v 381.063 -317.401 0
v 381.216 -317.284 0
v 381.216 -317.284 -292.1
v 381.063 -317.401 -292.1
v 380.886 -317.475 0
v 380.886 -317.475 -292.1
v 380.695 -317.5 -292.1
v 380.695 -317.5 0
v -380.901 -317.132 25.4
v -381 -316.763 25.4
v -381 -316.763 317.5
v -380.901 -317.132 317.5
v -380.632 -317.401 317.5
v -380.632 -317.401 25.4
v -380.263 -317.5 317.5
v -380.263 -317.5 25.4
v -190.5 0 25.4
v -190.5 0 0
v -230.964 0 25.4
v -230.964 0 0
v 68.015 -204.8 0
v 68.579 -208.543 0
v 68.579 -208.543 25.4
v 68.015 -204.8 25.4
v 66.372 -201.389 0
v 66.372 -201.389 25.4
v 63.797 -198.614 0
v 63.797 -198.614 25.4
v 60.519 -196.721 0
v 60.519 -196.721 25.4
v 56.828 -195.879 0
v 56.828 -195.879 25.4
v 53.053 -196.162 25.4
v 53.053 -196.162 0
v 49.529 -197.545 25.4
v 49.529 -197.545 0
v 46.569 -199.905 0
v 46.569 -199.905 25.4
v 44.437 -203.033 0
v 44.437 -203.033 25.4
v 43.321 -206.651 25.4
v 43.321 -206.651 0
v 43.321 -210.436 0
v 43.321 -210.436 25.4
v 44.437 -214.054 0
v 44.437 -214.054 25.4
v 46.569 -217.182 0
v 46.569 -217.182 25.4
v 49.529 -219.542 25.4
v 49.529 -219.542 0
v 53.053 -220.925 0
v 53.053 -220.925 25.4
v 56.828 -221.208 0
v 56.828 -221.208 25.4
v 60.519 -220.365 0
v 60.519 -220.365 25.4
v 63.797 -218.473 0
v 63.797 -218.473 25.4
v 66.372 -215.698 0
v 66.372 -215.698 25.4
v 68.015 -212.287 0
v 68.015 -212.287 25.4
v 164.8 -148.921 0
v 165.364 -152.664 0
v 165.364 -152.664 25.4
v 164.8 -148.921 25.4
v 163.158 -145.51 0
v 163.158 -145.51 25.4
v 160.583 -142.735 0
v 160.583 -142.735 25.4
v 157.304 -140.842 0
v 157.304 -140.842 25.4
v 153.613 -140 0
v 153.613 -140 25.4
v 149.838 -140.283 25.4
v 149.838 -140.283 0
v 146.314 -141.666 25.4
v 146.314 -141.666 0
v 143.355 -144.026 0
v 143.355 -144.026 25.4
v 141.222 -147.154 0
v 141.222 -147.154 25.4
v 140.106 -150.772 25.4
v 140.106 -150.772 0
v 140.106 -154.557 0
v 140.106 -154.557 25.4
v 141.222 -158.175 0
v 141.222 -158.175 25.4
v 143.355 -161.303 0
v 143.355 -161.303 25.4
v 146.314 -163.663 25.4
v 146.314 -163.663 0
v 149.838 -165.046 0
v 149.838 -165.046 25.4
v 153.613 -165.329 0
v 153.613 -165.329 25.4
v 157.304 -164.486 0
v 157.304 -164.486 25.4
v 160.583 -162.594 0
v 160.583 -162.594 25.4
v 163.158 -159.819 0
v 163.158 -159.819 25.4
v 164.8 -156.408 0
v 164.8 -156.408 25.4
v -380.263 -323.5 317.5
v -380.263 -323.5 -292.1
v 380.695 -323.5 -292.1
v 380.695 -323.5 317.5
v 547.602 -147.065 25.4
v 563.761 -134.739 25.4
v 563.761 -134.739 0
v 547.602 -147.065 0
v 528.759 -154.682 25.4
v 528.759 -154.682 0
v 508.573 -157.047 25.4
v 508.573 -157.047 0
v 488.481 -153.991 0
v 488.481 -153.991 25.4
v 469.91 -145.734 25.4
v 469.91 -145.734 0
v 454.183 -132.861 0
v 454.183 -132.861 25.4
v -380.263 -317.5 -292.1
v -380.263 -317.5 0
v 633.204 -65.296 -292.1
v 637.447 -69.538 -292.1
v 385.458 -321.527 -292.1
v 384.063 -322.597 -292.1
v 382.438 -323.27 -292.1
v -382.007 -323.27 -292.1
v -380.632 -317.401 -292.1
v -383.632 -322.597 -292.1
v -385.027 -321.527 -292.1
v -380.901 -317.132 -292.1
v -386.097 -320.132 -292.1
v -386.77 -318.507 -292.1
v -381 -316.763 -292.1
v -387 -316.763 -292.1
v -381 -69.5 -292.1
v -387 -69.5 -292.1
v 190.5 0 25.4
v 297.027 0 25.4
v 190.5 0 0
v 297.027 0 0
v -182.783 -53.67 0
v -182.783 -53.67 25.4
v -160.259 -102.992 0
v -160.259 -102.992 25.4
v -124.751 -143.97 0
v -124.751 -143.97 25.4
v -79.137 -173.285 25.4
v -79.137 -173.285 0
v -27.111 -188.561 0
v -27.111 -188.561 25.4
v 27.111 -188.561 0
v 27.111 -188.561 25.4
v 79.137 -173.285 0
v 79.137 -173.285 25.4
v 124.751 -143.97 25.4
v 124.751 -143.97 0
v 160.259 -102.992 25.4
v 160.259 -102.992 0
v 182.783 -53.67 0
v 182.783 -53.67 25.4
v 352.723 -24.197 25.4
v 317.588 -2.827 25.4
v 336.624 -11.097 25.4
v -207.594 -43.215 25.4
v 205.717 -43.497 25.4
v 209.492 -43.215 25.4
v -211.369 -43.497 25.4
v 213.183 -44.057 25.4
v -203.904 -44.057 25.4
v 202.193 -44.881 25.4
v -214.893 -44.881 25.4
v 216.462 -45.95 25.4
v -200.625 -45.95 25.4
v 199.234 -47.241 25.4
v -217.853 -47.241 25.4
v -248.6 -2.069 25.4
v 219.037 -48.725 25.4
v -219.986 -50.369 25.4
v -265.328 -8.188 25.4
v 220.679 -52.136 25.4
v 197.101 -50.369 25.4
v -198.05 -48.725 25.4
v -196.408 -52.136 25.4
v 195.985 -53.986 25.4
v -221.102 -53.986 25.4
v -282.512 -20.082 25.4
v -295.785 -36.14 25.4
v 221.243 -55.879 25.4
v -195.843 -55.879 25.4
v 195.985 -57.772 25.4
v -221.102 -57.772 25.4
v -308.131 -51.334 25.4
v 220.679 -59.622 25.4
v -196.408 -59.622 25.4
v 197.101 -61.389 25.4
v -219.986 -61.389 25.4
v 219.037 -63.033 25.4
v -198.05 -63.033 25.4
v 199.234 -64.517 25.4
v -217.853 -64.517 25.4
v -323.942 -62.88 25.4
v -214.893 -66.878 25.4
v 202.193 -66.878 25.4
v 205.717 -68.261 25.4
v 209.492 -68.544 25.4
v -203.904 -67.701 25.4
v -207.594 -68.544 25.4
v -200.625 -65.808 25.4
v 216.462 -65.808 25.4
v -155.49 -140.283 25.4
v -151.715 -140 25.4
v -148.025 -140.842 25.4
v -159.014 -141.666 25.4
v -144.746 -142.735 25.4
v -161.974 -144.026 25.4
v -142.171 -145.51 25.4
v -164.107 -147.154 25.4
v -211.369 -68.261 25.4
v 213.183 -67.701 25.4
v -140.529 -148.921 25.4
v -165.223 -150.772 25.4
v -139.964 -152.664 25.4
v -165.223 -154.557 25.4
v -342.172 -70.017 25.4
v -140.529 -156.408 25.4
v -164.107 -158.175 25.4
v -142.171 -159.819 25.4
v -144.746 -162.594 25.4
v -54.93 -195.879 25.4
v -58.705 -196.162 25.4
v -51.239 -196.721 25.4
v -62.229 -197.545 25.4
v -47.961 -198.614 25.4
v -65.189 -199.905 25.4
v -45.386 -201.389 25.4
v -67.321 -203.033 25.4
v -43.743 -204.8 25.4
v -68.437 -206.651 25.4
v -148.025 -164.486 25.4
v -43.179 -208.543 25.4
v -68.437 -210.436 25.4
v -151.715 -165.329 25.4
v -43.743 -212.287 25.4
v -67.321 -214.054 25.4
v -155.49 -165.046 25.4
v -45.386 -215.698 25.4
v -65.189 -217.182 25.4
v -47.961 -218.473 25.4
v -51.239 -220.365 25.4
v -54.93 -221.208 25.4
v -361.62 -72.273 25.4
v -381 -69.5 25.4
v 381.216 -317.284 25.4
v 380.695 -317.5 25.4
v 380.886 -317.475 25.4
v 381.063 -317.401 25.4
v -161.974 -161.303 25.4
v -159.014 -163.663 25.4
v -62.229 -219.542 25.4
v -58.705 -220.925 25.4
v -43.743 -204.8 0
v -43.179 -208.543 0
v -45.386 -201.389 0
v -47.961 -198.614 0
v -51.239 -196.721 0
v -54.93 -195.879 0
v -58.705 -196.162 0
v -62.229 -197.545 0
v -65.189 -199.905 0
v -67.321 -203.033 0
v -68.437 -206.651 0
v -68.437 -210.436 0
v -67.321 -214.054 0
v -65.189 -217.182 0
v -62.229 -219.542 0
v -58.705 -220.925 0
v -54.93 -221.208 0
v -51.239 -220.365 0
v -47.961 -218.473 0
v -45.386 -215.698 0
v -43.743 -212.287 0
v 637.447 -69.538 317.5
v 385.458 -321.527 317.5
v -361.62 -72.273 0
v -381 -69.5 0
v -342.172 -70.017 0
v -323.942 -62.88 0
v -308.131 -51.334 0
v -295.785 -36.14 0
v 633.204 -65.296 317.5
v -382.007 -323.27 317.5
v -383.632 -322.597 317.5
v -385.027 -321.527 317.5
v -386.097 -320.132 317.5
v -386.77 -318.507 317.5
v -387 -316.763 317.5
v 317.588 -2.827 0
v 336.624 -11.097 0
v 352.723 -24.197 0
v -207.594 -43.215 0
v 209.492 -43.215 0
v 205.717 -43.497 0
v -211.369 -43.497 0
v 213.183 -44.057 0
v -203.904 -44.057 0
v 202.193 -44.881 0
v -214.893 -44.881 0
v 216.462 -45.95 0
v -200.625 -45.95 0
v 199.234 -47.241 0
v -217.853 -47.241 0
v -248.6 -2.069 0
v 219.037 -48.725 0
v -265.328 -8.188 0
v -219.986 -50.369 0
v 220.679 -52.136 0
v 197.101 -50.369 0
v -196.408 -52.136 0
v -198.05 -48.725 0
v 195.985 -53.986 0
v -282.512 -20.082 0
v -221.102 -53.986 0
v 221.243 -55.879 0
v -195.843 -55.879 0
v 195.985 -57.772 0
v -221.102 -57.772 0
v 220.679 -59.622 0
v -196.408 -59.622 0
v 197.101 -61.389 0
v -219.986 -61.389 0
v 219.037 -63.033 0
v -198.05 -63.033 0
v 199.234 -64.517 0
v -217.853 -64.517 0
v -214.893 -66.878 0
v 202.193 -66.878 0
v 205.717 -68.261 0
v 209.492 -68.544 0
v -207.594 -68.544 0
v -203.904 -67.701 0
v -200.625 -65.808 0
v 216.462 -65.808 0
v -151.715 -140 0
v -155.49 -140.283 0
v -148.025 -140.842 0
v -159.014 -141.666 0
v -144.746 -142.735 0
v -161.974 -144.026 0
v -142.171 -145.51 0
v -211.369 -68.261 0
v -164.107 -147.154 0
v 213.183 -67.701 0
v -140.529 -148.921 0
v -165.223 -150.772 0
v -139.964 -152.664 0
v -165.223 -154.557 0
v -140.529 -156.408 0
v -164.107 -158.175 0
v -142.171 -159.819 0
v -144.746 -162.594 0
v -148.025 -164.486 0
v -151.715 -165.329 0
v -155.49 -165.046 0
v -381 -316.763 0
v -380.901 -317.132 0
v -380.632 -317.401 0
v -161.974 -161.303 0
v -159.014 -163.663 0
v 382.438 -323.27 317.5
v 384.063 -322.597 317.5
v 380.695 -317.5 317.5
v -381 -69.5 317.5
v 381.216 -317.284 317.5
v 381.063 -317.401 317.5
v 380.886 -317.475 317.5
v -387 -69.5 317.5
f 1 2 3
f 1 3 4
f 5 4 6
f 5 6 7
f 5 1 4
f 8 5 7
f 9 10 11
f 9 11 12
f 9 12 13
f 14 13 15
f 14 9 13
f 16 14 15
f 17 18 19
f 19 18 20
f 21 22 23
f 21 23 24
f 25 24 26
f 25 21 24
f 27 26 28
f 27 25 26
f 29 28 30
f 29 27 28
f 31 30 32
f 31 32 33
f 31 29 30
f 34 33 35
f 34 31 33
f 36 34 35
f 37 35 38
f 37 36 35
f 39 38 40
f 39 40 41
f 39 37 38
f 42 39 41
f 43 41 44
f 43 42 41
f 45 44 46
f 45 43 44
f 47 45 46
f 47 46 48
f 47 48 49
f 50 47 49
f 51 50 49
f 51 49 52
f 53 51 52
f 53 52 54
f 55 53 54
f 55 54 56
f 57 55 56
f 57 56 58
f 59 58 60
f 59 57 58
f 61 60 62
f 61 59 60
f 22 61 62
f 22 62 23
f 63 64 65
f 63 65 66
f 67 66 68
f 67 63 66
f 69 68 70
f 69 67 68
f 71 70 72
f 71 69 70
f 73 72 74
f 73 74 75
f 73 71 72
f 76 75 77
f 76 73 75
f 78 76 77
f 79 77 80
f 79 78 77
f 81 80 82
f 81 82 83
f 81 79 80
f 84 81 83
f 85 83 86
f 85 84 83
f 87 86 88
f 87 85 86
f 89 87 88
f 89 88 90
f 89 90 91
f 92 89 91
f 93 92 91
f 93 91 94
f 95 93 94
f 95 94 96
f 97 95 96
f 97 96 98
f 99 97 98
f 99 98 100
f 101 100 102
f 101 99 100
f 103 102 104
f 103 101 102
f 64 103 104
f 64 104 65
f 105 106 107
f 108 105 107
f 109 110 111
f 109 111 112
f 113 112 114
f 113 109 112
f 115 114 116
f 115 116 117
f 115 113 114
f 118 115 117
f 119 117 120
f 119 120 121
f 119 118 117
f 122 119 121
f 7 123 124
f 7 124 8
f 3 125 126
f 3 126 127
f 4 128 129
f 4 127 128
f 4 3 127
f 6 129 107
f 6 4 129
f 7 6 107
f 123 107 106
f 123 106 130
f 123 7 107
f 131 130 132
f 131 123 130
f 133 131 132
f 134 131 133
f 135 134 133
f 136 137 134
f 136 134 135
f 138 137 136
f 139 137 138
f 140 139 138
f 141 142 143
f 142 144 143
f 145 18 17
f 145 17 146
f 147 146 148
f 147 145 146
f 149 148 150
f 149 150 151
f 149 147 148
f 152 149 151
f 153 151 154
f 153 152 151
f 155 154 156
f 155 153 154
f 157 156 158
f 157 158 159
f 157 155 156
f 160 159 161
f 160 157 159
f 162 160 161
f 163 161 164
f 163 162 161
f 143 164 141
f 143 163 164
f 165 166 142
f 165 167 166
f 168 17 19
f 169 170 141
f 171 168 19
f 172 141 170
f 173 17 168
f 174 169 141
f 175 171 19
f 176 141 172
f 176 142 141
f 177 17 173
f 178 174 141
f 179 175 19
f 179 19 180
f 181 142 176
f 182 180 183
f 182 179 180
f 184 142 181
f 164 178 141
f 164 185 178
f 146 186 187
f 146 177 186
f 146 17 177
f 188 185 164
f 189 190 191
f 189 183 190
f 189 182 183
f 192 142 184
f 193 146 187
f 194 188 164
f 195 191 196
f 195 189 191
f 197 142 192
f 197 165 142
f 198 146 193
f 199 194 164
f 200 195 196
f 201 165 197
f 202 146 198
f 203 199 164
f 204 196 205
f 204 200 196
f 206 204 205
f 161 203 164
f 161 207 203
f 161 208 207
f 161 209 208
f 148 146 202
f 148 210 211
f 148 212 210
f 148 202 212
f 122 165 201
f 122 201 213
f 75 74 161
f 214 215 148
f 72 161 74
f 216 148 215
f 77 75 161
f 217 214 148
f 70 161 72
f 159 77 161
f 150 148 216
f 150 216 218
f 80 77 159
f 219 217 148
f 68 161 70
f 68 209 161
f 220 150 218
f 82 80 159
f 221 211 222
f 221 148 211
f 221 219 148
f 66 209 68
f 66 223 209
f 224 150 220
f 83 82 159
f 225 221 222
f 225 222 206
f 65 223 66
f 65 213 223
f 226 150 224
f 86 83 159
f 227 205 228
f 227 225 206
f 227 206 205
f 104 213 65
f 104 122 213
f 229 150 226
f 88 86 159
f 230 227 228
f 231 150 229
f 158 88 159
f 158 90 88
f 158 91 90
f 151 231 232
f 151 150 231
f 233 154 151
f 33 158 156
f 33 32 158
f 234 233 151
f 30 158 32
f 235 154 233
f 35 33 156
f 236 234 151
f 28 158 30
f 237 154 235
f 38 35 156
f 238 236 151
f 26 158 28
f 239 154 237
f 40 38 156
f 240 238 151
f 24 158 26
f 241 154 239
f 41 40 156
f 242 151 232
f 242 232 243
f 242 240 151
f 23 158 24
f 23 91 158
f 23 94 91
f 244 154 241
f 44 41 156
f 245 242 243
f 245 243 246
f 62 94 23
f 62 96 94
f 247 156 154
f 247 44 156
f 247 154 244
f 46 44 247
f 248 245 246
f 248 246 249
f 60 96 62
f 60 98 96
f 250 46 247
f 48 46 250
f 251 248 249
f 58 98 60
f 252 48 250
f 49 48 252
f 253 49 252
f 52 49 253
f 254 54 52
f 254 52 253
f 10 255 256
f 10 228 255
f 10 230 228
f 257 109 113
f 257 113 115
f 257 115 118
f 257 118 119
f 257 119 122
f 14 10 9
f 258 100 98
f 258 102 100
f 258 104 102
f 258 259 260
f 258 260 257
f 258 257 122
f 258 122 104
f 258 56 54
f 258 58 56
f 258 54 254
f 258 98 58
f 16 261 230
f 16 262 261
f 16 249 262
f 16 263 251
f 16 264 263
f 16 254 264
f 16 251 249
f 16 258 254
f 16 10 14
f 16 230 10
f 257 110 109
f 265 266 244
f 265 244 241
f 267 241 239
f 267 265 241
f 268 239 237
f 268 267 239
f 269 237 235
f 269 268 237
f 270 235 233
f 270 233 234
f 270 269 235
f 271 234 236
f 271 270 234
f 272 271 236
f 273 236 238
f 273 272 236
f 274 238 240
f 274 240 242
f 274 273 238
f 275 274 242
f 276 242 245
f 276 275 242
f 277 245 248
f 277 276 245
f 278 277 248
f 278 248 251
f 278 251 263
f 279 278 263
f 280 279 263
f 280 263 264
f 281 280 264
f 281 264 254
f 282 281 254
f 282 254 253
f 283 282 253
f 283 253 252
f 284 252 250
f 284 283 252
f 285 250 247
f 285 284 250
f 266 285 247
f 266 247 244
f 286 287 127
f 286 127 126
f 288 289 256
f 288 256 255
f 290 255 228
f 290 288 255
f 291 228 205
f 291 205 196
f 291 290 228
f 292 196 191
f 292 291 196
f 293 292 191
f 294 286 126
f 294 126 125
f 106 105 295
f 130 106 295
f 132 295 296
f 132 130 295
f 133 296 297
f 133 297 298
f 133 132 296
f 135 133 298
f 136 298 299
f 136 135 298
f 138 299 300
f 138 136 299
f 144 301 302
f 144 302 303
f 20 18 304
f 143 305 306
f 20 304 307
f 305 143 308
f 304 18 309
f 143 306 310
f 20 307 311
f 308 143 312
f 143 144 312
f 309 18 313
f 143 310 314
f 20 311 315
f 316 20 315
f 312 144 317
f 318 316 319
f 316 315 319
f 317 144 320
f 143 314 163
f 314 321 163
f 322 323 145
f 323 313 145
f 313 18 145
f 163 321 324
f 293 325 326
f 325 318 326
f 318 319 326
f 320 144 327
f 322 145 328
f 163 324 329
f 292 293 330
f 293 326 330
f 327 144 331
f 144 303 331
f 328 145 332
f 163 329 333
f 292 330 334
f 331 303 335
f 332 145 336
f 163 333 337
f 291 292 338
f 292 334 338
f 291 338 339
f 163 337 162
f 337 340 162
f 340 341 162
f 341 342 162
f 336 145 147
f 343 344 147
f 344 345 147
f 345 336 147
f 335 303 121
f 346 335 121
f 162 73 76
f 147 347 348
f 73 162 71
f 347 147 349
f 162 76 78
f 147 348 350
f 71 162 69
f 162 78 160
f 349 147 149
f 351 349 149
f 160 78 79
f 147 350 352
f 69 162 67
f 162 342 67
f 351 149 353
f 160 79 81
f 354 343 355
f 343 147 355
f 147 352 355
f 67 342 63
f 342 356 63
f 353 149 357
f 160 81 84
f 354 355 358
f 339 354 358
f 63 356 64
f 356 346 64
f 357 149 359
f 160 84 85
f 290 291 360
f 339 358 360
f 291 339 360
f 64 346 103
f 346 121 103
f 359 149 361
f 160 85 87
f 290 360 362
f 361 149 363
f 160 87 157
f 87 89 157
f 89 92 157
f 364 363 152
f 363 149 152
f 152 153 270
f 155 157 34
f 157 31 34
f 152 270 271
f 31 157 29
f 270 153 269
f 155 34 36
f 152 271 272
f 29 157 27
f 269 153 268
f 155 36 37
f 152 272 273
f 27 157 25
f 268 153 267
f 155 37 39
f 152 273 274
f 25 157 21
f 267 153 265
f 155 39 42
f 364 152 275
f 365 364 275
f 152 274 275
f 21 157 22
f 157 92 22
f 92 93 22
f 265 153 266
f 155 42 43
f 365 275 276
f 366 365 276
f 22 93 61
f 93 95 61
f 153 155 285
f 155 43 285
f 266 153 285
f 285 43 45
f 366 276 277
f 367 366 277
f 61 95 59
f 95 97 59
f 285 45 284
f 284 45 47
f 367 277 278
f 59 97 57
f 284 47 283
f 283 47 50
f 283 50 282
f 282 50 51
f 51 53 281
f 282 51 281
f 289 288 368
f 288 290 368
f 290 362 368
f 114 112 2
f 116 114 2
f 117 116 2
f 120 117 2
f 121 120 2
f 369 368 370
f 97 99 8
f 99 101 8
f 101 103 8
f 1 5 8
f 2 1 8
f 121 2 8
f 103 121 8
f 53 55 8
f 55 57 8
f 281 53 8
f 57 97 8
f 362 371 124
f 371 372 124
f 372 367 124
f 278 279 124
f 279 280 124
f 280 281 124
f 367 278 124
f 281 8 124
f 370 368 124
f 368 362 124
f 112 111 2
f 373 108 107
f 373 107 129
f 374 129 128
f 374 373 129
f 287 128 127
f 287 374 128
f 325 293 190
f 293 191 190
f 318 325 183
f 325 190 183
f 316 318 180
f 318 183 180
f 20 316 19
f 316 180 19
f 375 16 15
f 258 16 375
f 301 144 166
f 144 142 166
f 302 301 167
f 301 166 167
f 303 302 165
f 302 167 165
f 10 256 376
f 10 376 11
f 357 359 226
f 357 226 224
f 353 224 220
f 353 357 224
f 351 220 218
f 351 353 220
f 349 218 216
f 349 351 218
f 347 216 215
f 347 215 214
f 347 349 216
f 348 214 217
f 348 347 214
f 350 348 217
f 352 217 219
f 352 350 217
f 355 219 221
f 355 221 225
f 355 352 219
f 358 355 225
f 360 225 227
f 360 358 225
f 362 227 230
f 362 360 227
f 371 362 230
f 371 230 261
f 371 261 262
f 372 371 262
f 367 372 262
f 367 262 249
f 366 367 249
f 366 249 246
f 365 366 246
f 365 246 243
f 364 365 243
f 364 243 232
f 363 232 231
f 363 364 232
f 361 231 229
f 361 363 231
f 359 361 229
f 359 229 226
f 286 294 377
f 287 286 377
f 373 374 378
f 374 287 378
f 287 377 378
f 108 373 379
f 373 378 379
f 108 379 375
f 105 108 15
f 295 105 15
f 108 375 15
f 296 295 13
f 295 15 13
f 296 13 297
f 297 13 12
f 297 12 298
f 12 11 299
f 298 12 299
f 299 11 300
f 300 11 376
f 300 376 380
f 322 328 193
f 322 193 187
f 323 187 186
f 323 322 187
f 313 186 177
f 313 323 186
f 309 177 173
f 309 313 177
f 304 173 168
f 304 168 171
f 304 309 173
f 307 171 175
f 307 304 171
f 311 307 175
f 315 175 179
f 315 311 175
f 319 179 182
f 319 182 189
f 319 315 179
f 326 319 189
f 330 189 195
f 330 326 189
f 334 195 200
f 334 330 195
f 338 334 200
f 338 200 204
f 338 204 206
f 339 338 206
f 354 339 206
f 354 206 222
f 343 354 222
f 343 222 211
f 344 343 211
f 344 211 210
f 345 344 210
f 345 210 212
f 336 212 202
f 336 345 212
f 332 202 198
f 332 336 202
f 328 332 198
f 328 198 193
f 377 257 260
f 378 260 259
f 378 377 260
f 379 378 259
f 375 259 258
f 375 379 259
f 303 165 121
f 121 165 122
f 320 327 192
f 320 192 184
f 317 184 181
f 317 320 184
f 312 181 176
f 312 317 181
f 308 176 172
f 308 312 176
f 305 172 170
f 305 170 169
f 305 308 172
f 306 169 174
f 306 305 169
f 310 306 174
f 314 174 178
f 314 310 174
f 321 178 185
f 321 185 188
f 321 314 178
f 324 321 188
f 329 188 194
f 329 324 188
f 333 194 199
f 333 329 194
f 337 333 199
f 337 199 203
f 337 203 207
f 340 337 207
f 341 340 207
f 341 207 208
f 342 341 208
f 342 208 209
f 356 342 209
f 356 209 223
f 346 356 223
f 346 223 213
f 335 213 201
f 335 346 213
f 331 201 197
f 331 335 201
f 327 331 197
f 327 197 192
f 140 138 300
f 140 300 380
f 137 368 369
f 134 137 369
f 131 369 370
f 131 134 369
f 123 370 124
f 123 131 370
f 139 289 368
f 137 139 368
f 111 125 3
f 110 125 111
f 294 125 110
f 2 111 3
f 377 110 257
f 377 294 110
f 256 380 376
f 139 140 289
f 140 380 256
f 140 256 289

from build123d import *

# Parameters (mm, degrees)
SKETCH1_R                    = 241.3
SKETCH1_R_2                  = 190.5
SKETCH1_R_3                  = 12.7
BOSS_EXTRUDE1_DEPTH          = 25.4
SKETCH19_W                   = 762
SKETCH19_H                   = 609.6
BASE_FLANGE1_DEPTH           = 6
EDGE_FLANGE1_STRIP_CUT_DEPTH = 609.6
EDGE_FLANGE1_DEPTH           = 609.6
EDGE_FLANGE2_STRIP_W         = 25.4732
EDGE_FLANGE2_STRIP_H         = 6
EDGE_FLANGE2_STRIP_CUT_DEPTH = 609.6
EDGE_FLANGE2_DEPTH           = 609.6
BOSS_EXTRUDE2_DEPTH          = 12.7
BOSS_EXTRUDE2_DEPTH_BACK     = 12.7
FILLET1_R                    = 76.2
SKETCH30_R                   = 12.7
CUT_EXTRUDE1_DEPTH           = 783.174585068
FILLET3_R                    = 76.2


# Sheet-metal steps are written as plain solids
with BuildPart() as part:
    # Sketch1 → Boss-Extrude1 (new body)
    with BuildSketch(Plane.XY):
        Circle(SKETCH1_R)
        Circle(SKETCH1_R_2, mode=Mode.SUBTRACT)
        with Locations((55.879031838, 208.543385896)):
            Circle(SKETCH1_R_3, mode=Mode.SUBTRACT)
        with Locations((152.664354058, 152.664354058)):
            Circle(SKETCH1_R_3, mode=Mode.SUBTRACT)
        with Locations((208.543385896, 55.879031838)):
            Circle(SKETCH1_R_3, mode=Mode.SUBTRACT)
        with Locations((208.543385896, -55.879031838)):
            Circle(SKETCH1_R_3, mode=Mode.SUBTRACT)
        with Locations((152.664354058, -152.664354058)):
            Circle(SKETCH1_R_3, mode=Mode.SUBTRACT)
        with Locations((55.879031838, -208.543385896)):
            Circle(SKETCH1_R_3, mode=Mode.SUBTRACT)
        with Locations((-55.879031838, -208.543385896)):
            Circle(SKETCH1_R_3, mode=Mode.SUBTRACT)
        with Locations((-152.664354058, -152.664354058)):
            Circle(SKETCH1_R_3, mode=Mode.SUBTRACT)
        with Locations((-208.543385896, -55.879031838)):
            Circle(SKETCH1_R_3, mode=Mode.SUBTRACT)
        with Locations((-208.543385896, 55.879031838)):
            Circle(SKETCH1_R_3, mode=Mode.SUBTRACT)
        with Locations((-152.664354058, 152.664354058)):
            Circle(SKETCH1_R_3, mode=Mode.SUBTRACT)
        with Locations((-55.879031838, 208.543385896)):
            Circle(SKETCH1_R_3, mode=Mode.SUBTRACT)
    extrude(amount=BOSS_EXTRUDE1_DEPTH)



with BuildPart() as body_2:
    # Sketch19 → Base-Flange1 (new body)
    with BuildSketch(Plane(origin=(0, -317.5, 0), x_dir=(1, 0, 0), z_dir=(0, 1, 0))):
        with Locations((0, -12.7)):
            Rectangle(SKETCH19_W, SKETCH19_H)
    extrude(amount=-BASE_FLANGE1_DEPTH)

    # Edge-Flange1 strip (across the edge) → Edge-Flange1 strip cut (cut)
    with BuildSketch(Plane(origin=(381, -317.5, 317.5), x_dir=(-0.7071067811865438, 0.7071067811865512, 0), z_dir=(0, 0, -1))):
        Polygon((-22.039168001, 13.553886626), (-4.026895542, -4.458385832), (0.215745145, -0.215745145), (-17.796527314, 17.796527314), align=None)
    extrude(amount=EDGE_FLANGE1_STRIP_CUT_DEPTH, mode=Mode.SUBTRACT)

    # Edge-Flange1 section (across the edge) → Edge-Flange1 (add)
    with BuildSketch(Plane(origin=(381, -317.5, 317.5), x_dir=(-0.7071067811865438, 0.7071067811865512, 0), z_dir=(0, 0, -1))):
        with BuildLine():
            Line((-6, 0.30510971), (-6, 356.670718626))
            Line((-6, 356.670718626), (0, 356.670718626))
            Line((0, 356.670718626), (0, 0.30510971))
            ThreePointArc((0, 0.30510971), (0.056070336, 0.023225094), (0.215745145, -0.215745145))
            Line((0.215745145, -0.215745145), (-4.026895542, -4.458385832))
            ThreePointArc((-4.026895542, -4.458385832), (-5.487206859, -2.2728755), (-6, 0.30510971))
        make_face()
    extrude(amount=EDGE_FLANGE1_DEPTH)

    # Edge-Flange2 strip (across the edge) → Edge-Flange2 strip cut (cut)
    with BuildSketch(Plane(origin=(-381, -317.5, -292.1), x_dir=(1, 0, 0), z_dir=(0, 0, 1))):
        with Locations((-12, -3)):
            Rectangle(EDGE_FLANGE2_STRIP_W, EDGE_FLANGE2_STRIP_H)
    extrude(amount=EDGE_FLANGE2_STRIP_CUT_DEPTH, mode=Mode.SUBTRACT)

    # Edge-Flange2 section (across the edge) → Edge-Flange2 (add)
    with BuildSketch(Plane(origin=(-381, -317.5, -292.1), x_dir=(1, 0, 0), z_dir=(0, 0, 1))):
        with BuildLine():
            Line((-6, 0.7366), (-6, 248))
            Line((-6, 248), (0, 248))
            Line((0, 248), (0, 0.7366))
            ThreePointArc((0, 0.7366), (0.215745145, 0.215745145), (0.7366, 0))
            Line((0.7366, 0), (0.7366, -6))
            ThreePointArc((0.7366, -6), (-4.026895542, -4.026895542), (-6, 0.7366))
        make_face()
    extrude(amount=EDGE_FLANGE2_DEPTH)


with BuildPart() as part_1:
    add(part.part)

    add(body_2.part)  # Boss-Extrude2 merges body 2
    # Sketch2 → Boss-Extrude2 (add, two sides: drawn at the far end of the back side and taken through both)
    with BuildSketch(Plane(origin=(0, 0, 12.7), x_dir=(-1, 0, 0), z_dir=(0, 0, -1)).offset(-BOSS_EXTRUDE2_DEPTH_BACK)):
        with BuildLine():
            Line((-176.371629871, 164.677679655), (-508, -190.5))
            Line((-508, -190.5), (-381, -317.5))
            Line((-381, -317.5), (381, -317.5))
            Line((381, -317.5), (381, -190.5))
            Line((381, -190.5), (211.187529283, 116.728391899))
            ThreePointArc((211.187529283, 116.728391899), (-29.628031694, -239.474152547), (-176.371629871, 164.677679655))
        make_face()
    extrude(amount=BOSS_EXTRUDE2_DEPTH + BOSS_EXTRUDE2_DEPTH_BACK)

    # Fillet1
    # the kernel refuses this fillet: 76.2 mm, written as the material it adds along each edge
    with BuildSketch(Plane(origin=(-381, -190.5, 0), x_dir=(0, 1, 0), z_dir=(0, 0, 1))) as fillet1_piece_1:
        with BuildLine():
            CenterArc((194.419807723, -20.395387566), FILLET1_R, 164.475167034, 76.594355804)
            Line((157.558210281, -87.086186287), (156.820978332, -88.420002261))
            Line((156.820978332, -88.420002261), (-0.737231949, -1.333815974))
            Line((-0.737231949, -1.333815974), (0, 1.524))
            ThreePointArc((0, 1.524), (60.5, 1.524), (119.531603846, 0.407907751))
            Line((119.531603846, 0.407907751), (121, 0))
        make_face()
    extrude(amount=25.4)
    with BuildSketch(Plane(origin=(508, -190.5, 25.4), x_dir=(0.7071067811865509, 0.707106781186544, 0), z_dir=(0, 0, -1))) as fillet1_piece_2:
        with BuildLine():
            CenterArc((FILLET1_R * 1.03487581695, -FILLET1_R), FILLET1_R, 90, 91.963796982)
            Line((FILLET1_R * 0.0354631377737, -FILLET1_R * 1.03426801283), (FILLET1_R * 0.0154748841901, -FILLET1_R * 1.03495337309))
            Line((FILLET1_R * 0.0154748841901, -FILLET1_R * 1.03495337309), (-FILLET1_R * 0.020697516339, FILLET1_R * 0.02))
            Line((-FILLET1_R * 0.020697516339, FILLET1_R * 0.02), (FILLET1_R * 1.03487581695, FILLET1_R * 0.02))
            Line((FILLET1_R * 1.03487581695, FILLET1_R * 0.02), (FILLET1_R * 1.03487581695, 0))
        make_face()
    extrude(amount=25.4)

    # Sketch30 → Cut-Extrude1 (cut, through all)
    # profile 1 of 3: a face of its own
    with BuildSketch(Plane(origin=(0, 0, 0), x_dir=(-1, 0, 0), z_dir=(0, 0, -1))):
        with BuildLine():
            Line((-330.130702101, 0), (-241.3, 0))
            ThreePointArc((-241.3, 0), (-224.481808047, 88.507671171), (-176.371629871, 164.677679655))
            Line((-176.371629871, 164.677679655), (-330.130702101, 0))
        make_face()
    # profile 2 of 3: a face of its own
    with BuildSketch(Plane(origin=(0, 0, 0), x_dir=(-1, 0, 0), z_dir=(0, 0, -1))):
        with BuildLine():
            Line((-241.3, 0), (-190.5, 0))
            ThreePointArc((-190.5, 0), (0, 190.5), (190.5, 0))
            Line((190.5, 0), (241.3, 0))
            ThreePointArc((241.3, 0), (233.650637508, 60.274949954), (211.187529283, 116.728391899))
            ThreePointArc((211.187529283, 116.728391899), (29.628031694, 239.474152547), (-176.371629871, 164.677679655))
            ThreePointArc((-176.371629871, 164.677679655), (-224.481808047, 88.507671171), (-241.3, 0))
        make_face()
        with Locations((-208.543385896, 55.879031838)):
            Circle(SKETCH30_R, mode=Mode.SUBTRACT)
        with Locations((-152.664354058, 152.664354058)):
            Circle(SKETCH30_R, mode=Mode.SUBTRACT)
        with Locations((-55.879031838, 208.543385896)):
            Circle(SKETCH30_R, mode=Mode.SUBTRACT)
        with Locations((208.543385896, 55.879031838)):
            Circle(SKETCH30_R, mode=Mode.SUBTRACT)
        with Locations((55.879031838, 208.543385896)):
            Circle(SKETCH30_R, mode=Mode.SUBTRACT)
        with Locations((152.664354058, 152.664354058)):
            Circle(SKETCH30_R, mode=Mode.SUBTRACT)
    # profile 3 of 3: a face of its own
    with BuildSketch(Plane(origin=(0, 0, 0), x_dir=(-1, 0, 0), z_dir=(0, 0, -1))):
        with BuildLine():
            ThreePointArc((211.187529283, 116.728391899), (233.650637508, 60.274949954), (241.3, 0))
            Line((241.3, 0), (275.706099682, 0))
            Line((275.706099682, 0), (211.187529283, 116.728391899))
        make_face()
    extrude(amount=-CUT_EXTRUDE1_DEPTH, mode=Mode.SUBTRACT)

    # Fillet3
    fillet3_edges = [part_1.edges().sort_by_distance(p)[0] for p in [
        (-275.706099682, 0, 12.7),
        (330.130702101, 0, 12.7),
    ]]
    fillet(fillet3_edges, radius=FILLET3_R)


solid = part_1.part
